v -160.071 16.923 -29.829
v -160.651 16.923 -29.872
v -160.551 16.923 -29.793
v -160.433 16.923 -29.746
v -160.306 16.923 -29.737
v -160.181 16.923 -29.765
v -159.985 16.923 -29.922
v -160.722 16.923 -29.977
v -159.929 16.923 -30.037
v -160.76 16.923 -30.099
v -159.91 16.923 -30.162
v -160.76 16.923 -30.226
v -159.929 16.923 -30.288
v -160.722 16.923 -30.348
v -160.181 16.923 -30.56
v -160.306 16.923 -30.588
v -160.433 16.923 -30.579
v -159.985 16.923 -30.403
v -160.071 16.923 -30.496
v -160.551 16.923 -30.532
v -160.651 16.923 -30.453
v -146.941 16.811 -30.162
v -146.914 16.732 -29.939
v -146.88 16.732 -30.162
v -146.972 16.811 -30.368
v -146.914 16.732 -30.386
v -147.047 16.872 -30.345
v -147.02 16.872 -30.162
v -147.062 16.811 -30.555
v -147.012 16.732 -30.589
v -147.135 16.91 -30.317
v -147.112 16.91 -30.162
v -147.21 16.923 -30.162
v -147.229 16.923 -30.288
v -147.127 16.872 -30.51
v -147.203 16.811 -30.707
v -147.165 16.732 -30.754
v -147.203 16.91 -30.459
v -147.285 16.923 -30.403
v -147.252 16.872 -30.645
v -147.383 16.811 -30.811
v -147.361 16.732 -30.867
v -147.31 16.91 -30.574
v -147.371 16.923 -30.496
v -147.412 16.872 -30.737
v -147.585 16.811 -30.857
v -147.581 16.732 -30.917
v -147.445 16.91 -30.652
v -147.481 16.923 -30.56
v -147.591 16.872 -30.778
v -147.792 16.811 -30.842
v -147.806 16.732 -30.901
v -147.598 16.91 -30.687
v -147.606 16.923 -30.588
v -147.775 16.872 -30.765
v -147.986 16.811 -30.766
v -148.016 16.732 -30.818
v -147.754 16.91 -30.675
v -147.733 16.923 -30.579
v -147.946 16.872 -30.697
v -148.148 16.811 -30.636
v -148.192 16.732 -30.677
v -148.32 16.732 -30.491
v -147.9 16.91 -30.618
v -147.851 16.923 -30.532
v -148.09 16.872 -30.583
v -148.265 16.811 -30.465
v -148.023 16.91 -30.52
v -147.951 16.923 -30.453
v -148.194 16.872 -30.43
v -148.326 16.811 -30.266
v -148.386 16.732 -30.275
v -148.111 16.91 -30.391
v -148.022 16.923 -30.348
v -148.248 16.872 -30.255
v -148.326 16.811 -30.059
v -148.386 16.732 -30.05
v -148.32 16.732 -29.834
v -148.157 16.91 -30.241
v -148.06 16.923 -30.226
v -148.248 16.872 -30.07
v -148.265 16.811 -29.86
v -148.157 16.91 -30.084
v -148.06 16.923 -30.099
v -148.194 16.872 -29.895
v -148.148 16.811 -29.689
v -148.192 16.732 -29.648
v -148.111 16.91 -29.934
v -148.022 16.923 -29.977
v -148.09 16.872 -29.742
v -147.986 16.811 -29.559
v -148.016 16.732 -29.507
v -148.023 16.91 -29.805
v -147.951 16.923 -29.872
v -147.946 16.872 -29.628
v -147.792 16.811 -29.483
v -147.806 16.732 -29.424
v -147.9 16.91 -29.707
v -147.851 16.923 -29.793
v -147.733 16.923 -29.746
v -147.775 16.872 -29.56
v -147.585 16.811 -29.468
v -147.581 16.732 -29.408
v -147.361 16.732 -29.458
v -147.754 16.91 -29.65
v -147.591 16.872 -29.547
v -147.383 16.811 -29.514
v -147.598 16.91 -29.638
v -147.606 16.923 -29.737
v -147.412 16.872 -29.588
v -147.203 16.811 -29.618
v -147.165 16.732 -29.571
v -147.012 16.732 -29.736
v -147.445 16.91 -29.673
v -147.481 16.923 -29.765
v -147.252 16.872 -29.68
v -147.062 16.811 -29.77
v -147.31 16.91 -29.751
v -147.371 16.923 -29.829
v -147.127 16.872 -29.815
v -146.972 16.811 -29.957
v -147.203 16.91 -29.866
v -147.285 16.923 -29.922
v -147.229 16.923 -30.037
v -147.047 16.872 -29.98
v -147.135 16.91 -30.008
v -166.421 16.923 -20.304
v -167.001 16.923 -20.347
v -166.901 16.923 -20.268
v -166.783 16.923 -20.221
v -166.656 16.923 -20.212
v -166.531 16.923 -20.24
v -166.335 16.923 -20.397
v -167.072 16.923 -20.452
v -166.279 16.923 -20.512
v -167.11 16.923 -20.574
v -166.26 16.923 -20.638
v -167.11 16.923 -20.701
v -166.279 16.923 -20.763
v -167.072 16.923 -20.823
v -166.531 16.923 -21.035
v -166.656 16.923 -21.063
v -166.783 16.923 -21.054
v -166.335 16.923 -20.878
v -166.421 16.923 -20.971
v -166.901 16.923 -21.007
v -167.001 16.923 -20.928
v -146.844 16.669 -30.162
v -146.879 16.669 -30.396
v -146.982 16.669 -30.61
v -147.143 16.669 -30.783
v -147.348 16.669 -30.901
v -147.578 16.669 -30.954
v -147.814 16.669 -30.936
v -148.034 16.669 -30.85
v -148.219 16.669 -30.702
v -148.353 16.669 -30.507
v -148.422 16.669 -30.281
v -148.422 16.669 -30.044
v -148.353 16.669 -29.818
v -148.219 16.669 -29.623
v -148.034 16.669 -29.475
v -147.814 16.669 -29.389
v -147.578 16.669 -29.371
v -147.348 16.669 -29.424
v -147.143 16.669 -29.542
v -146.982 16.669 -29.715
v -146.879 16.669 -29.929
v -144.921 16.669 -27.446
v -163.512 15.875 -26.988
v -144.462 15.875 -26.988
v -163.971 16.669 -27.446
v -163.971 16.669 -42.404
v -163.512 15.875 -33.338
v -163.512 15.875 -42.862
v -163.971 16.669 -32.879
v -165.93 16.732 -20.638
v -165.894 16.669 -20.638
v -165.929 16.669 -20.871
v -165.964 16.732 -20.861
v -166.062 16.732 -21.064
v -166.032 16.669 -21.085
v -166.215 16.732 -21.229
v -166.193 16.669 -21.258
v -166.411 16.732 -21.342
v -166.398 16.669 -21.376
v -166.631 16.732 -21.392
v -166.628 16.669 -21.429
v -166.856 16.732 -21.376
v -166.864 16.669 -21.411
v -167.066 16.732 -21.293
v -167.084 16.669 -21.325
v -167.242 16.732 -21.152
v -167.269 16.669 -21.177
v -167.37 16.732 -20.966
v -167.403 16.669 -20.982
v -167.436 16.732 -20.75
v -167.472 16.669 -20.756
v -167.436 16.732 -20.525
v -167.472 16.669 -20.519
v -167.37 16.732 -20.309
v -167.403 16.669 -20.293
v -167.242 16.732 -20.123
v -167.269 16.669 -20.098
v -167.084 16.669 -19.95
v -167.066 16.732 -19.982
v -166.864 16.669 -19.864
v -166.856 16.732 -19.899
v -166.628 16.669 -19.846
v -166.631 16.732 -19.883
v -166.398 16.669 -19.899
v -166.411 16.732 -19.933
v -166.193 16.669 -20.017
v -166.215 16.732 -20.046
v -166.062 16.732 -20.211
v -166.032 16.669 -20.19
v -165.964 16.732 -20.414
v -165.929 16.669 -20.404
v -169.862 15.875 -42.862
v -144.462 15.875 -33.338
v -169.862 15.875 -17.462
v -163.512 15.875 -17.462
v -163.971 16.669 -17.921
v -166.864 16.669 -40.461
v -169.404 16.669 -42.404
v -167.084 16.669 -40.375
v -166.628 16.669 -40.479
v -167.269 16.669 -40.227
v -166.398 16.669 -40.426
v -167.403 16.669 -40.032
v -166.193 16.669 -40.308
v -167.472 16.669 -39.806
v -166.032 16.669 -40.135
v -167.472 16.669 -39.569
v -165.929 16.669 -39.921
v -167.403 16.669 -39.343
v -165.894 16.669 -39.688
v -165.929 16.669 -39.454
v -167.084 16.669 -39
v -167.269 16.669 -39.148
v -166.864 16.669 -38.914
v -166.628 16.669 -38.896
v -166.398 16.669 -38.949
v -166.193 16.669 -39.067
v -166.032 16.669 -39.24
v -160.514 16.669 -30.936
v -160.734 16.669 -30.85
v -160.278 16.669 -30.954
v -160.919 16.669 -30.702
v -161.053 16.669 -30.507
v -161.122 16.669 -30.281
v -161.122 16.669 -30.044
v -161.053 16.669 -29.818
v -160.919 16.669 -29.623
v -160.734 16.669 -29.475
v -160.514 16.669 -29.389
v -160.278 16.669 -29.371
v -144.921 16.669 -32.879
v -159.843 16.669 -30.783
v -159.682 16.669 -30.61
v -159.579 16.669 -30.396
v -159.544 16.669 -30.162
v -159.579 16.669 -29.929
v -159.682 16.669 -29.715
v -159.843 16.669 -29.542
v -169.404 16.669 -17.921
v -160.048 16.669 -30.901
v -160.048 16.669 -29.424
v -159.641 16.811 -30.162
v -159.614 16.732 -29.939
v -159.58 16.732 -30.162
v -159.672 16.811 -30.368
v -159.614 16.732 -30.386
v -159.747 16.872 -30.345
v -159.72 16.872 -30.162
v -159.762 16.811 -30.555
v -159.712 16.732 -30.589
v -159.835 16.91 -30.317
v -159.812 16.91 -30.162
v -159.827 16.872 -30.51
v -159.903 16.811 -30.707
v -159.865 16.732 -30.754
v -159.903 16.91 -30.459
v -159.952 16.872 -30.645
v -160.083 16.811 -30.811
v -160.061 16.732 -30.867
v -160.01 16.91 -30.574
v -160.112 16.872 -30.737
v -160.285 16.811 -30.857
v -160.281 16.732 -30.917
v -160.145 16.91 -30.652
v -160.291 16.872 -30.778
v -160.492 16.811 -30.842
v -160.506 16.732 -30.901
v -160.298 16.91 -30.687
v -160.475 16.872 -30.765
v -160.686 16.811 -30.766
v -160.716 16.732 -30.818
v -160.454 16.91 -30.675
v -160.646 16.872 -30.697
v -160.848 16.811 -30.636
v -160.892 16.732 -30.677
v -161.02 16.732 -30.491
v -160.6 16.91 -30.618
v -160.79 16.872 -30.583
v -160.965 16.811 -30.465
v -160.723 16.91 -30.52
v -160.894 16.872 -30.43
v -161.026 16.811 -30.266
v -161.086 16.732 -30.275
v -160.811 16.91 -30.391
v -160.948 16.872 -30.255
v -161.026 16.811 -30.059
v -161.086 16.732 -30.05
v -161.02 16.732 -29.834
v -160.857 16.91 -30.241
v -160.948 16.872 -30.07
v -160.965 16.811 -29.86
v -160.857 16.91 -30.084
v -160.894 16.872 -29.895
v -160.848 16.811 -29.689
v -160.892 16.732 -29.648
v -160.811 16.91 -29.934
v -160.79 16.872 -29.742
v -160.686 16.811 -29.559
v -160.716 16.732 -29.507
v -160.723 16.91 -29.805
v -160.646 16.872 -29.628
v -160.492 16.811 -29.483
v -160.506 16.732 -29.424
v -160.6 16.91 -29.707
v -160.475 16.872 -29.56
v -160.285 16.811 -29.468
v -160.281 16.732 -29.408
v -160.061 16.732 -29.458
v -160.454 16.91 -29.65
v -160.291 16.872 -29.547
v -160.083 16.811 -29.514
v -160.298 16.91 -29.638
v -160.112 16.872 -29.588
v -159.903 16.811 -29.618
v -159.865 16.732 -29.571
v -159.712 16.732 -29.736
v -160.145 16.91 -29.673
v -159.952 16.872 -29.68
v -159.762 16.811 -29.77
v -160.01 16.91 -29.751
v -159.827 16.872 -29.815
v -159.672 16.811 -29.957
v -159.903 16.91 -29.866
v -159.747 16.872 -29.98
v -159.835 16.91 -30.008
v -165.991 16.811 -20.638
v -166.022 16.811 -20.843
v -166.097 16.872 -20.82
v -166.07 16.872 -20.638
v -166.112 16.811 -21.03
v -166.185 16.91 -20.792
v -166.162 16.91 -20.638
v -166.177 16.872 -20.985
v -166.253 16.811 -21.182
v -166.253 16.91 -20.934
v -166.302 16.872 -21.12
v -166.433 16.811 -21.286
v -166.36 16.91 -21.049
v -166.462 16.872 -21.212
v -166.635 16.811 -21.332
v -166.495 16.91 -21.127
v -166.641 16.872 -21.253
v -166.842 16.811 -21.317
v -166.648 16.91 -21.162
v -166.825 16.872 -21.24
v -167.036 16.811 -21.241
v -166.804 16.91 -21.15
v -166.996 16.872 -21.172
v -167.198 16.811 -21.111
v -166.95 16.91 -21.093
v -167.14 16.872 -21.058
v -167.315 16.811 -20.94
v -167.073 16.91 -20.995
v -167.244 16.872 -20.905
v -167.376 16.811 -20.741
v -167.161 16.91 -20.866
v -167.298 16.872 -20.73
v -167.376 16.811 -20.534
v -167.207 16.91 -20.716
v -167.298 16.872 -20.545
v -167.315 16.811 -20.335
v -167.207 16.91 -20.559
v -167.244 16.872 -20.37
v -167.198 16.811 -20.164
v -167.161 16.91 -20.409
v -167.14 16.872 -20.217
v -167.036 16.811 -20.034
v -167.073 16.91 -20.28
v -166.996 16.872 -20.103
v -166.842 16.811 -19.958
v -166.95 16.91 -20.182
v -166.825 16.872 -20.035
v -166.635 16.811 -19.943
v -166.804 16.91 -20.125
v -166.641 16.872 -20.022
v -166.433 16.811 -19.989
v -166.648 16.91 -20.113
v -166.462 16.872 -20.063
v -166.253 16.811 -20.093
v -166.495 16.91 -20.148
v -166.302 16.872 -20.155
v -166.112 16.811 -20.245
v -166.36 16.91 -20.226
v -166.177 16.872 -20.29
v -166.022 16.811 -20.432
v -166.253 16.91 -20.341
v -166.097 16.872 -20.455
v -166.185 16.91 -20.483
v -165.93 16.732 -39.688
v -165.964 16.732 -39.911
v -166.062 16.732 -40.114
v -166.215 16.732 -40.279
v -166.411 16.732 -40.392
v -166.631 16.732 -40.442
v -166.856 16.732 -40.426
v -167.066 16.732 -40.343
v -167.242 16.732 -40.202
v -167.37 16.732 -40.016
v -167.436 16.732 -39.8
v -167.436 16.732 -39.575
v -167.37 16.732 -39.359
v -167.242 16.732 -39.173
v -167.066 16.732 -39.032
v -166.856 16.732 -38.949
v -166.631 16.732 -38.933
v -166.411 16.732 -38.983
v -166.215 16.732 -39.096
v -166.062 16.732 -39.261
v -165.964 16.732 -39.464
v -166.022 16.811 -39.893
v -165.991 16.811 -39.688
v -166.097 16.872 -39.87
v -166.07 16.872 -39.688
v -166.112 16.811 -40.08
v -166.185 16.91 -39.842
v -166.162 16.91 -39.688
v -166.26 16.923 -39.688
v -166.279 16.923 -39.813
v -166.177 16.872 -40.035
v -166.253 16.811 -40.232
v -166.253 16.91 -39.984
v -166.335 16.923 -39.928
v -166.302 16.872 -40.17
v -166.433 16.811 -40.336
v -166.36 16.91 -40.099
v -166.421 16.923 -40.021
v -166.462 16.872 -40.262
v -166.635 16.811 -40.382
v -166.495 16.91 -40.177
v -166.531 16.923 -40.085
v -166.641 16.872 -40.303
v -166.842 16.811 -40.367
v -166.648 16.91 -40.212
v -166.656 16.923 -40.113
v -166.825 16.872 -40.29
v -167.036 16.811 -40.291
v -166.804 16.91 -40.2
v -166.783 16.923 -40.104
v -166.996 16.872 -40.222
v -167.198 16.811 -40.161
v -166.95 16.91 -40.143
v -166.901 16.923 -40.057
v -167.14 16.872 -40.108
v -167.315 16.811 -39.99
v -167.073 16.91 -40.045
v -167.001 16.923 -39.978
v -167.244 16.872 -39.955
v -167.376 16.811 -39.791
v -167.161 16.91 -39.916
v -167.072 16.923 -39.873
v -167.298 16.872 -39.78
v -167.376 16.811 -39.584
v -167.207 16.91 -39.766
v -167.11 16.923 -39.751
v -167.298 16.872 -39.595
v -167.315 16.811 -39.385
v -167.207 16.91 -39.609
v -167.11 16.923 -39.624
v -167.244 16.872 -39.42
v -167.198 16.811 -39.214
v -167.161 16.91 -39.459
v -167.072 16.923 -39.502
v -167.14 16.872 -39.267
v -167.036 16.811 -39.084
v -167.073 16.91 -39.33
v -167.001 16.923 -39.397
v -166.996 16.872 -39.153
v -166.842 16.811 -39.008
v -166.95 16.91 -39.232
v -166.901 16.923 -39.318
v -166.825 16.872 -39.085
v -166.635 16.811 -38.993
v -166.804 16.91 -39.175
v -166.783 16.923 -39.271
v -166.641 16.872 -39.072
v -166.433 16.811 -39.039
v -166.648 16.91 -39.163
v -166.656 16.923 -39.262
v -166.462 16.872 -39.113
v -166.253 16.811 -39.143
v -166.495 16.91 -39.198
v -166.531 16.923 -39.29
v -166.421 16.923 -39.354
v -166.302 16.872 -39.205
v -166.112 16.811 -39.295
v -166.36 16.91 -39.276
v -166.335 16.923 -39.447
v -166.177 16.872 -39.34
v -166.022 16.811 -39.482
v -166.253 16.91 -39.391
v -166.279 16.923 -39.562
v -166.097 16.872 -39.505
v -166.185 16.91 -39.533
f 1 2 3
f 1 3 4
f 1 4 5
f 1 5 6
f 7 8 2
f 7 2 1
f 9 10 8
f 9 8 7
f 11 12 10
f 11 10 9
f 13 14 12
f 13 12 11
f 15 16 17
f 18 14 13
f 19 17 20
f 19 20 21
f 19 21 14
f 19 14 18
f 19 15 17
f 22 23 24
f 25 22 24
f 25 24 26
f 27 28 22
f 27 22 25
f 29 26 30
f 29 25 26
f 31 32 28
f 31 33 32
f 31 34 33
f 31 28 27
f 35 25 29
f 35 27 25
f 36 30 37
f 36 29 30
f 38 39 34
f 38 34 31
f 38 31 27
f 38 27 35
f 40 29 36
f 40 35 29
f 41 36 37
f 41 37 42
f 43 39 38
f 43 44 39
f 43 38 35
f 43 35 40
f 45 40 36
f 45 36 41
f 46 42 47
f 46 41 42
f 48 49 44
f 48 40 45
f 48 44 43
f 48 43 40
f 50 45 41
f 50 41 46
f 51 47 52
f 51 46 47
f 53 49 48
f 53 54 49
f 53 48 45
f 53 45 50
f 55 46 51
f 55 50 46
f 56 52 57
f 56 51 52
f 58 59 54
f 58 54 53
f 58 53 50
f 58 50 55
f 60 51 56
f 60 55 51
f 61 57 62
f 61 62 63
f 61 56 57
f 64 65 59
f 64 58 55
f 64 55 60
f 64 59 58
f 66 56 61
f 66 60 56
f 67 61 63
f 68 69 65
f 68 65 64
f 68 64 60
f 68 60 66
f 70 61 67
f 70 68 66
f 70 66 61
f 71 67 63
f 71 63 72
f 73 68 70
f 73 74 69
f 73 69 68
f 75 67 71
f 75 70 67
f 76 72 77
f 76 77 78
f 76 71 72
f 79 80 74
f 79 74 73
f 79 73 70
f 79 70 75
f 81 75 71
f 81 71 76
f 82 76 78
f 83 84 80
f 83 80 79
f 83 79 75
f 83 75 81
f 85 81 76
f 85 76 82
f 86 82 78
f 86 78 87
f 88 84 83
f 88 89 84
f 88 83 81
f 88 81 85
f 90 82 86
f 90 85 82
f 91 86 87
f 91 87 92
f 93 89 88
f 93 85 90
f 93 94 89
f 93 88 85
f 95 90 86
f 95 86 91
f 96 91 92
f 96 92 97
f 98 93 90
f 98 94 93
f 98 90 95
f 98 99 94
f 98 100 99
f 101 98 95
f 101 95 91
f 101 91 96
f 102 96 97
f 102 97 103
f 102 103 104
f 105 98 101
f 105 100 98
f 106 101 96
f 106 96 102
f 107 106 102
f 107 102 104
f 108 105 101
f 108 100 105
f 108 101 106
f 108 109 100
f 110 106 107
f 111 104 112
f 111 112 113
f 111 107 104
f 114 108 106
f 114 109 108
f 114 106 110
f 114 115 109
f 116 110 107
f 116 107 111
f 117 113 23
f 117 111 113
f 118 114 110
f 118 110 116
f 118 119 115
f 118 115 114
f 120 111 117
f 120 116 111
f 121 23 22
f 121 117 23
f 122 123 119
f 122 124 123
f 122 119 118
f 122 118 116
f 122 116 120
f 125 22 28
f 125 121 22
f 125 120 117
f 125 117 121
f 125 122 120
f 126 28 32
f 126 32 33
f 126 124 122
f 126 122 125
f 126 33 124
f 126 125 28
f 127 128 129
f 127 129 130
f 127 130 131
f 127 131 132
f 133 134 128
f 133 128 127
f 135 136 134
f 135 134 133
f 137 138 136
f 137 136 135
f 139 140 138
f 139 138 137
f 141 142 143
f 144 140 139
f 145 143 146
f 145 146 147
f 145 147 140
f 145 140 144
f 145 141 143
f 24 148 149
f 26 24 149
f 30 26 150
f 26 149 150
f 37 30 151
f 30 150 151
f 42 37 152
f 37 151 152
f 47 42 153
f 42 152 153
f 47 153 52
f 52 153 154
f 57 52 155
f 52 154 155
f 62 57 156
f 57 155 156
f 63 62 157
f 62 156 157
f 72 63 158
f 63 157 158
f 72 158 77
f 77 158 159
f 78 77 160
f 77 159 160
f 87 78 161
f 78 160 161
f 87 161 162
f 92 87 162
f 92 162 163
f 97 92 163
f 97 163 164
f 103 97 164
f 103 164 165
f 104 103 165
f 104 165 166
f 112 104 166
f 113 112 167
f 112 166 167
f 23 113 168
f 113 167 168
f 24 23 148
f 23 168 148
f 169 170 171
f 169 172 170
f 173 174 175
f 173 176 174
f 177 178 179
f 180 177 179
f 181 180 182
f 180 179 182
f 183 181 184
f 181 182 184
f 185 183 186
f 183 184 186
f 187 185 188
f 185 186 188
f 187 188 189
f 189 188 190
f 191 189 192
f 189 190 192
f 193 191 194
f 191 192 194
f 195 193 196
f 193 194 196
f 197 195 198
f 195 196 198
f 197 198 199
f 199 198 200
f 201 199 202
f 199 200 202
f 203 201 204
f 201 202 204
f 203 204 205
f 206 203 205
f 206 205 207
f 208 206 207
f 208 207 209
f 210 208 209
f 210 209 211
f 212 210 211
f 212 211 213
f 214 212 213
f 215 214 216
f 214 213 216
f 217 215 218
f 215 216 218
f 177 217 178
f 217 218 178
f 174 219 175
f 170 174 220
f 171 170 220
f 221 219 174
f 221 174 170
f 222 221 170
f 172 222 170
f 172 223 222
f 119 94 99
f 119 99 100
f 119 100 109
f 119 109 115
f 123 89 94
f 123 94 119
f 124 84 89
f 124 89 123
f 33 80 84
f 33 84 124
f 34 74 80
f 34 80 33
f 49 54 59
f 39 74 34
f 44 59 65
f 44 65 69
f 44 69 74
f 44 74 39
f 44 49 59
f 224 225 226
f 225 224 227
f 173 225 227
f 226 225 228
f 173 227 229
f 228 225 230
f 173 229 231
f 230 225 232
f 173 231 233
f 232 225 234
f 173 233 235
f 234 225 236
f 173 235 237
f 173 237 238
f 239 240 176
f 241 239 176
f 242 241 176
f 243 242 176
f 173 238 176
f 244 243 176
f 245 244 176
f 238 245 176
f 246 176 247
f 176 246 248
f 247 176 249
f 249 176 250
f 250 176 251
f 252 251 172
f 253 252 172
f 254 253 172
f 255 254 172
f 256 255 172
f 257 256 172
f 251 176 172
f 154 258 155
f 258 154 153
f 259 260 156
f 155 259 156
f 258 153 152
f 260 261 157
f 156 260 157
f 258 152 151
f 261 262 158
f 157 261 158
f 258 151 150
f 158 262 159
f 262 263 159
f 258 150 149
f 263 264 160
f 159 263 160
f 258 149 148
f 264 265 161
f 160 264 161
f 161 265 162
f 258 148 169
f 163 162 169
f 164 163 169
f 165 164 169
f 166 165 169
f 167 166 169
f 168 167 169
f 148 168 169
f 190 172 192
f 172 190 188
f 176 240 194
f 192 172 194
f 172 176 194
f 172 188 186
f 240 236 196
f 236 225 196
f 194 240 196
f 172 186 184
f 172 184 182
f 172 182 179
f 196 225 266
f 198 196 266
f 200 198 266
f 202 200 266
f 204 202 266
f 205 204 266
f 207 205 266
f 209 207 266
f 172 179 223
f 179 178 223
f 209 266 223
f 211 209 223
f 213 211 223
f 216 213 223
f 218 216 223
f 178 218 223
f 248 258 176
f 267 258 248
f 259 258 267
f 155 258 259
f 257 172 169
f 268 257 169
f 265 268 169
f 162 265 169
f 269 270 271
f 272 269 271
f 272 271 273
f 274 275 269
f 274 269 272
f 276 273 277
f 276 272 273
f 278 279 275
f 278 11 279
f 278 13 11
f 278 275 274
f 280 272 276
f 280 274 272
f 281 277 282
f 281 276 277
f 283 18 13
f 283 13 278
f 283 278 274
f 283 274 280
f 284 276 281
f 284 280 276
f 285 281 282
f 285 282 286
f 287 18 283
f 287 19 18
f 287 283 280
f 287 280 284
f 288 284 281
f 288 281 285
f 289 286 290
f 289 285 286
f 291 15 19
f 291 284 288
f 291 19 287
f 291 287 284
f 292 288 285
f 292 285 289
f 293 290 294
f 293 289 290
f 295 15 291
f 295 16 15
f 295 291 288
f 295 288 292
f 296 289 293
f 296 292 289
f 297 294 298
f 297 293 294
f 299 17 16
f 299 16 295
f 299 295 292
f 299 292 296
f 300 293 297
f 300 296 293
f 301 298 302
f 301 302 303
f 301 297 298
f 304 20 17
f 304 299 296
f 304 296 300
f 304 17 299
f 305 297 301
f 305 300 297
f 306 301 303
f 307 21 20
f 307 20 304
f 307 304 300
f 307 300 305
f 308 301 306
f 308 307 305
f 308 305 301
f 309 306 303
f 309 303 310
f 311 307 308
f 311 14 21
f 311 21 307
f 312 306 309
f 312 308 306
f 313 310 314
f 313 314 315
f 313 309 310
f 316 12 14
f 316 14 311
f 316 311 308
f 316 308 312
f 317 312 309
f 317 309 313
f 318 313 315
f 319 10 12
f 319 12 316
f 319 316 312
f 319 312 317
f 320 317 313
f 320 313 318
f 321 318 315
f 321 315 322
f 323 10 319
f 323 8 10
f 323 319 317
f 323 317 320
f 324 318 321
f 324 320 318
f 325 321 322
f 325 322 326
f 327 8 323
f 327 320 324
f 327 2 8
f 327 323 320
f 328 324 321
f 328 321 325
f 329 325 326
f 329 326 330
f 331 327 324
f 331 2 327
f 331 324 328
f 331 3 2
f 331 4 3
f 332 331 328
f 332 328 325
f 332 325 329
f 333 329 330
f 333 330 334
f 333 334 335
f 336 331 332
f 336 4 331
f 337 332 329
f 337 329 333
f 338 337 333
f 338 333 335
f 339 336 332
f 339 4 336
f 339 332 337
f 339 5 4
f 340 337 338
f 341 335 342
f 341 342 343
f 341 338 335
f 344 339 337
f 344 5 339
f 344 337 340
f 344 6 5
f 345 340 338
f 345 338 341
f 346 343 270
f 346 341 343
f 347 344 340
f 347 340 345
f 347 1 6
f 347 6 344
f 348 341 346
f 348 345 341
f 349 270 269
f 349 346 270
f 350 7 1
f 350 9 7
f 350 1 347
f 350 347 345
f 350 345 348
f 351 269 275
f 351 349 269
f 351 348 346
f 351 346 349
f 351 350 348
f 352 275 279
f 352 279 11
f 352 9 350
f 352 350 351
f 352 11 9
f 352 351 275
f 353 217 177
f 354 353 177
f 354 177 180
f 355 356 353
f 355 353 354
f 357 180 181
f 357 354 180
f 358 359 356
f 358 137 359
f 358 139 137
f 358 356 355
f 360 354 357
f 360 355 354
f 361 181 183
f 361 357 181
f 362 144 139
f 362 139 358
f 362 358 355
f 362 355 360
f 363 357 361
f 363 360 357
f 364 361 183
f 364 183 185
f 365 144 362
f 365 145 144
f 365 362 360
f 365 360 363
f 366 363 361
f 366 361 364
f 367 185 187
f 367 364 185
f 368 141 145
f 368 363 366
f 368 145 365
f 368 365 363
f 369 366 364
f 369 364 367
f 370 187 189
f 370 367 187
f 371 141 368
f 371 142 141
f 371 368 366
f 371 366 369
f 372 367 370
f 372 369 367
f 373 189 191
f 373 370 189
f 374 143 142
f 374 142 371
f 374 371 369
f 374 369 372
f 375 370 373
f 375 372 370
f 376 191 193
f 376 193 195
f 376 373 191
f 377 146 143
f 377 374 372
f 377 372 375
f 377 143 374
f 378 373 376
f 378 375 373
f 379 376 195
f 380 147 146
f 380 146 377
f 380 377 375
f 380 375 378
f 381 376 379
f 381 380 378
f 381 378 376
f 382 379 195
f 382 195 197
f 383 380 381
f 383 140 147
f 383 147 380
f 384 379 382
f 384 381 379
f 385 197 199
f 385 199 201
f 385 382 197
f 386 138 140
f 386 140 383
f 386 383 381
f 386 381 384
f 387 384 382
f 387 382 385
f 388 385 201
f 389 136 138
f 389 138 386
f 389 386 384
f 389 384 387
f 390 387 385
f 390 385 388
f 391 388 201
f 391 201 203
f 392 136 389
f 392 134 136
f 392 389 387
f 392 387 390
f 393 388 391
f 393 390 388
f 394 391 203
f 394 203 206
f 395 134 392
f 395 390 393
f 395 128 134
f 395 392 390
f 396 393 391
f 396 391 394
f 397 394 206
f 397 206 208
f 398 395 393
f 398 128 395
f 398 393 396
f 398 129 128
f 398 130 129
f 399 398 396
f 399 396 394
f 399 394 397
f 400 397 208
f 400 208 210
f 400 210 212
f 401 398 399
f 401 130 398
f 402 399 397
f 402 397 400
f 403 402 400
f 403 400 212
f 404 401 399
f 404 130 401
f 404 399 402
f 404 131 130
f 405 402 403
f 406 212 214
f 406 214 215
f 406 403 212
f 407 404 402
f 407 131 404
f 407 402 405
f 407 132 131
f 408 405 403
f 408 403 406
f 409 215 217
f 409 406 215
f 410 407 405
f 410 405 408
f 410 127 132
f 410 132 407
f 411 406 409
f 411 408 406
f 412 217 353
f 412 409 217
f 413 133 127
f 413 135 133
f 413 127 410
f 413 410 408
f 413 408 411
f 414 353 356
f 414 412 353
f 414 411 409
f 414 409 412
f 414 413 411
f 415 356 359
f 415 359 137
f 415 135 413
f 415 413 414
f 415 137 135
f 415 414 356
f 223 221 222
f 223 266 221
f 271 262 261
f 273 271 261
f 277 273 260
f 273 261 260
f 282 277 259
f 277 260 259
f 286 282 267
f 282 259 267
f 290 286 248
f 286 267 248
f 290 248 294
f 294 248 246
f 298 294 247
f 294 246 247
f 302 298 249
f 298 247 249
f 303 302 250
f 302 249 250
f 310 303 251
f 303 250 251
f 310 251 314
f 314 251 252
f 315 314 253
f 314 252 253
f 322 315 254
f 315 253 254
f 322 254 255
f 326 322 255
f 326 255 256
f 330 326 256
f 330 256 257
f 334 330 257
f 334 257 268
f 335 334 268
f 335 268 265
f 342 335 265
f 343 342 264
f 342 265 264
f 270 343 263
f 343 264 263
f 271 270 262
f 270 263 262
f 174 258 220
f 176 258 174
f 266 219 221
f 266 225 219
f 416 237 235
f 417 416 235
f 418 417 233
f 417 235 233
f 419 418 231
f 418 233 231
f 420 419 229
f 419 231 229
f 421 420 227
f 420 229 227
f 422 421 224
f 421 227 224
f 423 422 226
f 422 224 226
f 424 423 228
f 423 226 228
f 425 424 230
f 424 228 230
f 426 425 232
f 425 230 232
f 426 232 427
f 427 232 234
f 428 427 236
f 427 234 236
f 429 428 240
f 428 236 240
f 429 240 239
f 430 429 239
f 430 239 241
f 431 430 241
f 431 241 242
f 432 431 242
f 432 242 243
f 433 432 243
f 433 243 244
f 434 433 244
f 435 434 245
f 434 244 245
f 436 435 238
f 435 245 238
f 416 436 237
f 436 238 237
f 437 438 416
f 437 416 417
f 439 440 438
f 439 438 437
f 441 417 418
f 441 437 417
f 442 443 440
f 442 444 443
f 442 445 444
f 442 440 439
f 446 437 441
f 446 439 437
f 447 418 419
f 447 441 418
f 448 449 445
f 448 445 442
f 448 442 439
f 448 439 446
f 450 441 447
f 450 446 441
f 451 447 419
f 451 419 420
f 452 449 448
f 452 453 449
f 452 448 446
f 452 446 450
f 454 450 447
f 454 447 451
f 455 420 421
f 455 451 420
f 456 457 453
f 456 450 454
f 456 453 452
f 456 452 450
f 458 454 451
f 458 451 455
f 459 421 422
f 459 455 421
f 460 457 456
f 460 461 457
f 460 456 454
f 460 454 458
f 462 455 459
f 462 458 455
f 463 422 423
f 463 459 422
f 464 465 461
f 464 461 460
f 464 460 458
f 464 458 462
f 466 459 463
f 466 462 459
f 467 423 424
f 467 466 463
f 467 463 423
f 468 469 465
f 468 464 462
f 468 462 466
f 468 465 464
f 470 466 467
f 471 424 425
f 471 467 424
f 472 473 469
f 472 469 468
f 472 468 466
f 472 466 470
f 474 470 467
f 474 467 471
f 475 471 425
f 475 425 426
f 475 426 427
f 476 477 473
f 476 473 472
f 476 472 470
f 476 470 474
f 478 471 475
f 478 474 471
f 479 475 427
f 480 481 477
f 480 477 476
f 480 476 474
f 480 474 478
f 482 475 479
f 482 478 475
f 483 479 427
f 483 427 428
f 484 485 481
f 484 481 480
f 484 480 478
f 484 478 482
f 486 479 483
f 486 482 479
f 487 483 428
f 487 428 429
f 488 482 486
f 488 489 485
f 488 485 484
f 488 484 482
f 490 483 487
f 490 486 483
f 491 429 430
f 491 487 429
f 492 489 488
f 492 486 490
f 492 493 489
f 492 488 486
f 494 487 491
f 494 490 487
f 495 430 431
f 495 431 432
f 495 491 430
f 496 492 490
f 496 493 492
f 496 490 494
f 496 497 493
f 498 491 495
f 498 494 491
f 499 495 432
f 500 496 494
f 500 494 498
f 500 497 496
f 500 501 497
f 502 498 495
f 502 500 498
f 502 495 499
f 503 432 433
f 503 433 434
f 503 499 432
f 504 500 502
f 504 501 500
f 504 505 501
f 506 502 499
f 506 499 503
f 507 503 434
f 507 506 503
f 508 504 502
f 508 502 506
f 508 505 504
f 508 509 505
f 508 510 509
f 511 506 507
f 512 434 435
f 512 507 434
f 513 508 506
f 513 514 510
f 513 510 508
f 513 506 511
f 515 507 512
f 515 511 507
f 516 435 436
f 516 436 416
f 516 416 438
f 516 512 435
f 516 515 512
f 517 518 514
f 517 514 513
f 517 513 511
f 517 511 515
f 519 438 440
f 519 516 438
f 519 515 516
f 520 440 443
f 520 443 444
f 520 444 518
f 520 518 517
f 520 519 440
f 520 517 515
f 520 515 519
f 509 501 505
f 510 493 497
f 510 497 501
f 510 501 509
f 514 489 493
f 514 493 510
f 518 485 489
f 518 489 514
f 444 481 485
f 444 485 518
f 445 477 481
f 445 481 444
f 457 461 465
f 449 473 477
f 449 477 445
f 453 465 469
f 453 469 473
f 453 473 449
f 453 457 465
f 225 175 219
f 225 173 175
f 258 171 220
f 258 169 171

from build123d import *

# Parameters (mm, degrees)
BOSS_EXTRUDE1_DEPTH           = 0.79375
BOSS_EXTRUDE1_TAPER           = 30
SKETCH3_R                     = 0.79375
BOSS_EXTRUDE2_DEPTH           = 0.254
BOSS_EXTRUDE2_DRAFT           = 30
BOSS_EXTRUDE2_PROFILE_2_DEPTH = 0.254
BOSS_EXTRUDE2_PROFILE_2_DRAFT = 30
BOSS_EXTRUDE2_PROFILE_3_DEPTH = 0.254
BOSS_EXTRUDE2_PROFILE_3_DRAFT = 30
BOSS_EXTRUDE2_PROFILE_4_DEPTH = 0.254
BOSS_EXTRUDE2_PROFILE_4_DRAFT = 30
FILLET1_R                     = 0.381


with BuildPart() as part:
    # Sketch2 → Boss-Extrude1 (new body)
    with BuildSketch(Plane(origin=(0, 15.875, 0), x_dir=(1, 0, 0), z_dir=(0, 1, 0))):
        Polygon((-169.8625, 42.8625), (-169.8625, 17.4625), (-163.5125, 17.4625), (-163.5125, 26.9875), (-144.4625, 26.9875), (-144.4625, 33.3375), (-163.5125, 33.3375), (-163.5125, 42.8625), align=None)
    extrude(amount=BOSS_EXTRUDE1_DEPTH, taper=BOSS_EXTRUDE1_TAPER)


with BuildPart() as boss_extrude2_tool:
    # Sketch3 → Boss-Extrude2 (with draft: the straight prism first)
    with BuildSketch(Plane(origin=(0, 16.66875, 0), x_dir=(1, 0, 0), z_dir=(0, 1, 0))):
        with Locations((-147.6375, 30.1625)):
            Circle(SKETCH3_R)
    extrude(amount=BOSS_EXTRUDE2_DEPTH)
    # Boss-Extrude2: the draft: its side faces are tilted about the plane it starts from
    boss_extrude2_sides = [boss_extrude2_tool.faces().sort_by_distance(p)[0] for p in [
        (-148.43125, 16.79575, -30.1625),
    ]]
    draft(boss_extrude2_sides, Plane(origin=(0, 16.66875, 0), x_dir=(1, 0, 0), z_dir=(0, 1, 0)), BOSS_EXTRUDE2_DRAFT)


with BuildPart() as part_1:
    add(part.part)

    # Boss-Extrude2: add boss_extrude2_tool
    add(boss_extrude2_tool.part)


with BuildPart() as boss_extrude2_profile_2_tool:
    # Sketch3 → Boss-Extrude2 profile 2 (with draft: the straight prism first)
    with BuildSketch(Plane(origin=(0, 16.66875, 0), x_dir=(1, 0, 0), z_dir=(0, 1, 0))):
        with Locations((-160.3375, 30.1625)):
            Circle(SKETCH3_R)
    extrude(amount=BOSS_EXTRUDE2_PROFILE_2_DEPTH)
    # Boss-Extrude2 profile 2: the draft: its side faces are tilted about the plane it starts from
    boss_extrude2_profile_2_sides = [boss_extrude2_profile_2_tool.faces().sort_by_distance(p)[0] for p in [
        (-161.13125, 16.79575, -30.1625),
    ]]
    draft(boss_extrude2_profile_2_sides, Plane(origin=(0, 16.66875, 0), x_dir=(1, 0, 0), z_dir=(0, 1, 0)), BOSS_EXTRUDE2_PROFILE_2_DRAFT)


with BuildPart() as part_2:
    add(part_1.part)

    # Boss-Extrude2 profile 2: add boss_extrude2_profile_2_tool
    add(boss_extrude2_profile_2_tool.part)


with BuildPart() as boss_extrude2_profile_3_tool:
    # Sketch3 → Boss-Extrude2 profile 3 (with draft: the straight prism first)
    with BuildSketch(Plane(origin=(0, 16.66875, 0), x_dir=(1, 0, 0), z_dir=(0, 1, 0))):
        with Locations((-166.6875, 39.6875)):
            Circle(SKETCH3_R)
    extrude(amount=BOSS_EXTRUDE2_PROFILE_3_DEPTH)
    # Boss-Extrude2 profile 3: the draft: its side faces are tilted about the plane it starts from
    boss_extrude2_profile_3_sides = [boss_extrude2_profile_3_tool.faces().sort_by_distance(p)[0] for p in [
        (-167.48125, 16.79575, -39.6875),
    ]]
    draft(boss_extrude2_profile_3_sides, Plane(origin=(0, 16.66875, 0), x_dir=(1, 0, 0), z_dir=(0, 1, 0)), BOSS_EXTRUDE2_PROFILE_3_DRAFT)


with BuildPart() as part_3:
    add(part_2.part)

    # Boss-Extrude2 profile 3: add boss_extrude2_profile_3_tool
    add(boss_extrude2_profile_3_tool.part)


with BuildPart() as boss_extrude2_profile_4_tool:
    # Sketch3 → Boss-Extrude2 profile 4 (with draft: the straight prism first)
    with BuildSketch(Plane(origin=(0, 16.66875, 0), x_dir=(1, 0, 0), z_dir=(0, 1, 0))):
        with Locations((-166.6875, 20.6375)):
            Circle(SKETCH3_R)
    extrude(amount=BOSS_EXTRUDE2_PROFILE_4_DEPTH)
    # Boss-Extrude2 profile 4: the draft: its side faces are tilted about the plane it starts from
    boss_extrude2_profile_4_sides = [boss_extrude2_profile_4_tool.faces().sort_by_distance(p)[0] for p in [
        (-167.48125, 16.79575, -20.6375),
    ]]
    draft(boss_extrude2_profile_4_sides, Plane(origin=(0, 16.66875, 0), x_dir=(1, 0, 0), z_dir=(0, 1, 0)), BOSS_EXTRUDE2_PROFILE_4_DRAFT)


with BuildPart() as part_4:
    add(part_3.part)

    # Boss-Extrude2 profile 4: add boss_extrude2_profile_4_tool
    add(boss_extrude2_profile_4_tool.part)

    # Fillet1
    fillet1_edges = [part_4.edges().sort_by_distance(p)[0] for p in [
        (-148.284603032, 16.92275, -30.1625),
        (-160.984603032, 16.92275, -30.1625),
        (-167.334603032, 16.92275, -39.6875),
        (-167.334603032, 16.92275, -20.6375),
    ]]
    fillet(fillet1_edges, radius=FILLET1_R)


solid = part_4.part
